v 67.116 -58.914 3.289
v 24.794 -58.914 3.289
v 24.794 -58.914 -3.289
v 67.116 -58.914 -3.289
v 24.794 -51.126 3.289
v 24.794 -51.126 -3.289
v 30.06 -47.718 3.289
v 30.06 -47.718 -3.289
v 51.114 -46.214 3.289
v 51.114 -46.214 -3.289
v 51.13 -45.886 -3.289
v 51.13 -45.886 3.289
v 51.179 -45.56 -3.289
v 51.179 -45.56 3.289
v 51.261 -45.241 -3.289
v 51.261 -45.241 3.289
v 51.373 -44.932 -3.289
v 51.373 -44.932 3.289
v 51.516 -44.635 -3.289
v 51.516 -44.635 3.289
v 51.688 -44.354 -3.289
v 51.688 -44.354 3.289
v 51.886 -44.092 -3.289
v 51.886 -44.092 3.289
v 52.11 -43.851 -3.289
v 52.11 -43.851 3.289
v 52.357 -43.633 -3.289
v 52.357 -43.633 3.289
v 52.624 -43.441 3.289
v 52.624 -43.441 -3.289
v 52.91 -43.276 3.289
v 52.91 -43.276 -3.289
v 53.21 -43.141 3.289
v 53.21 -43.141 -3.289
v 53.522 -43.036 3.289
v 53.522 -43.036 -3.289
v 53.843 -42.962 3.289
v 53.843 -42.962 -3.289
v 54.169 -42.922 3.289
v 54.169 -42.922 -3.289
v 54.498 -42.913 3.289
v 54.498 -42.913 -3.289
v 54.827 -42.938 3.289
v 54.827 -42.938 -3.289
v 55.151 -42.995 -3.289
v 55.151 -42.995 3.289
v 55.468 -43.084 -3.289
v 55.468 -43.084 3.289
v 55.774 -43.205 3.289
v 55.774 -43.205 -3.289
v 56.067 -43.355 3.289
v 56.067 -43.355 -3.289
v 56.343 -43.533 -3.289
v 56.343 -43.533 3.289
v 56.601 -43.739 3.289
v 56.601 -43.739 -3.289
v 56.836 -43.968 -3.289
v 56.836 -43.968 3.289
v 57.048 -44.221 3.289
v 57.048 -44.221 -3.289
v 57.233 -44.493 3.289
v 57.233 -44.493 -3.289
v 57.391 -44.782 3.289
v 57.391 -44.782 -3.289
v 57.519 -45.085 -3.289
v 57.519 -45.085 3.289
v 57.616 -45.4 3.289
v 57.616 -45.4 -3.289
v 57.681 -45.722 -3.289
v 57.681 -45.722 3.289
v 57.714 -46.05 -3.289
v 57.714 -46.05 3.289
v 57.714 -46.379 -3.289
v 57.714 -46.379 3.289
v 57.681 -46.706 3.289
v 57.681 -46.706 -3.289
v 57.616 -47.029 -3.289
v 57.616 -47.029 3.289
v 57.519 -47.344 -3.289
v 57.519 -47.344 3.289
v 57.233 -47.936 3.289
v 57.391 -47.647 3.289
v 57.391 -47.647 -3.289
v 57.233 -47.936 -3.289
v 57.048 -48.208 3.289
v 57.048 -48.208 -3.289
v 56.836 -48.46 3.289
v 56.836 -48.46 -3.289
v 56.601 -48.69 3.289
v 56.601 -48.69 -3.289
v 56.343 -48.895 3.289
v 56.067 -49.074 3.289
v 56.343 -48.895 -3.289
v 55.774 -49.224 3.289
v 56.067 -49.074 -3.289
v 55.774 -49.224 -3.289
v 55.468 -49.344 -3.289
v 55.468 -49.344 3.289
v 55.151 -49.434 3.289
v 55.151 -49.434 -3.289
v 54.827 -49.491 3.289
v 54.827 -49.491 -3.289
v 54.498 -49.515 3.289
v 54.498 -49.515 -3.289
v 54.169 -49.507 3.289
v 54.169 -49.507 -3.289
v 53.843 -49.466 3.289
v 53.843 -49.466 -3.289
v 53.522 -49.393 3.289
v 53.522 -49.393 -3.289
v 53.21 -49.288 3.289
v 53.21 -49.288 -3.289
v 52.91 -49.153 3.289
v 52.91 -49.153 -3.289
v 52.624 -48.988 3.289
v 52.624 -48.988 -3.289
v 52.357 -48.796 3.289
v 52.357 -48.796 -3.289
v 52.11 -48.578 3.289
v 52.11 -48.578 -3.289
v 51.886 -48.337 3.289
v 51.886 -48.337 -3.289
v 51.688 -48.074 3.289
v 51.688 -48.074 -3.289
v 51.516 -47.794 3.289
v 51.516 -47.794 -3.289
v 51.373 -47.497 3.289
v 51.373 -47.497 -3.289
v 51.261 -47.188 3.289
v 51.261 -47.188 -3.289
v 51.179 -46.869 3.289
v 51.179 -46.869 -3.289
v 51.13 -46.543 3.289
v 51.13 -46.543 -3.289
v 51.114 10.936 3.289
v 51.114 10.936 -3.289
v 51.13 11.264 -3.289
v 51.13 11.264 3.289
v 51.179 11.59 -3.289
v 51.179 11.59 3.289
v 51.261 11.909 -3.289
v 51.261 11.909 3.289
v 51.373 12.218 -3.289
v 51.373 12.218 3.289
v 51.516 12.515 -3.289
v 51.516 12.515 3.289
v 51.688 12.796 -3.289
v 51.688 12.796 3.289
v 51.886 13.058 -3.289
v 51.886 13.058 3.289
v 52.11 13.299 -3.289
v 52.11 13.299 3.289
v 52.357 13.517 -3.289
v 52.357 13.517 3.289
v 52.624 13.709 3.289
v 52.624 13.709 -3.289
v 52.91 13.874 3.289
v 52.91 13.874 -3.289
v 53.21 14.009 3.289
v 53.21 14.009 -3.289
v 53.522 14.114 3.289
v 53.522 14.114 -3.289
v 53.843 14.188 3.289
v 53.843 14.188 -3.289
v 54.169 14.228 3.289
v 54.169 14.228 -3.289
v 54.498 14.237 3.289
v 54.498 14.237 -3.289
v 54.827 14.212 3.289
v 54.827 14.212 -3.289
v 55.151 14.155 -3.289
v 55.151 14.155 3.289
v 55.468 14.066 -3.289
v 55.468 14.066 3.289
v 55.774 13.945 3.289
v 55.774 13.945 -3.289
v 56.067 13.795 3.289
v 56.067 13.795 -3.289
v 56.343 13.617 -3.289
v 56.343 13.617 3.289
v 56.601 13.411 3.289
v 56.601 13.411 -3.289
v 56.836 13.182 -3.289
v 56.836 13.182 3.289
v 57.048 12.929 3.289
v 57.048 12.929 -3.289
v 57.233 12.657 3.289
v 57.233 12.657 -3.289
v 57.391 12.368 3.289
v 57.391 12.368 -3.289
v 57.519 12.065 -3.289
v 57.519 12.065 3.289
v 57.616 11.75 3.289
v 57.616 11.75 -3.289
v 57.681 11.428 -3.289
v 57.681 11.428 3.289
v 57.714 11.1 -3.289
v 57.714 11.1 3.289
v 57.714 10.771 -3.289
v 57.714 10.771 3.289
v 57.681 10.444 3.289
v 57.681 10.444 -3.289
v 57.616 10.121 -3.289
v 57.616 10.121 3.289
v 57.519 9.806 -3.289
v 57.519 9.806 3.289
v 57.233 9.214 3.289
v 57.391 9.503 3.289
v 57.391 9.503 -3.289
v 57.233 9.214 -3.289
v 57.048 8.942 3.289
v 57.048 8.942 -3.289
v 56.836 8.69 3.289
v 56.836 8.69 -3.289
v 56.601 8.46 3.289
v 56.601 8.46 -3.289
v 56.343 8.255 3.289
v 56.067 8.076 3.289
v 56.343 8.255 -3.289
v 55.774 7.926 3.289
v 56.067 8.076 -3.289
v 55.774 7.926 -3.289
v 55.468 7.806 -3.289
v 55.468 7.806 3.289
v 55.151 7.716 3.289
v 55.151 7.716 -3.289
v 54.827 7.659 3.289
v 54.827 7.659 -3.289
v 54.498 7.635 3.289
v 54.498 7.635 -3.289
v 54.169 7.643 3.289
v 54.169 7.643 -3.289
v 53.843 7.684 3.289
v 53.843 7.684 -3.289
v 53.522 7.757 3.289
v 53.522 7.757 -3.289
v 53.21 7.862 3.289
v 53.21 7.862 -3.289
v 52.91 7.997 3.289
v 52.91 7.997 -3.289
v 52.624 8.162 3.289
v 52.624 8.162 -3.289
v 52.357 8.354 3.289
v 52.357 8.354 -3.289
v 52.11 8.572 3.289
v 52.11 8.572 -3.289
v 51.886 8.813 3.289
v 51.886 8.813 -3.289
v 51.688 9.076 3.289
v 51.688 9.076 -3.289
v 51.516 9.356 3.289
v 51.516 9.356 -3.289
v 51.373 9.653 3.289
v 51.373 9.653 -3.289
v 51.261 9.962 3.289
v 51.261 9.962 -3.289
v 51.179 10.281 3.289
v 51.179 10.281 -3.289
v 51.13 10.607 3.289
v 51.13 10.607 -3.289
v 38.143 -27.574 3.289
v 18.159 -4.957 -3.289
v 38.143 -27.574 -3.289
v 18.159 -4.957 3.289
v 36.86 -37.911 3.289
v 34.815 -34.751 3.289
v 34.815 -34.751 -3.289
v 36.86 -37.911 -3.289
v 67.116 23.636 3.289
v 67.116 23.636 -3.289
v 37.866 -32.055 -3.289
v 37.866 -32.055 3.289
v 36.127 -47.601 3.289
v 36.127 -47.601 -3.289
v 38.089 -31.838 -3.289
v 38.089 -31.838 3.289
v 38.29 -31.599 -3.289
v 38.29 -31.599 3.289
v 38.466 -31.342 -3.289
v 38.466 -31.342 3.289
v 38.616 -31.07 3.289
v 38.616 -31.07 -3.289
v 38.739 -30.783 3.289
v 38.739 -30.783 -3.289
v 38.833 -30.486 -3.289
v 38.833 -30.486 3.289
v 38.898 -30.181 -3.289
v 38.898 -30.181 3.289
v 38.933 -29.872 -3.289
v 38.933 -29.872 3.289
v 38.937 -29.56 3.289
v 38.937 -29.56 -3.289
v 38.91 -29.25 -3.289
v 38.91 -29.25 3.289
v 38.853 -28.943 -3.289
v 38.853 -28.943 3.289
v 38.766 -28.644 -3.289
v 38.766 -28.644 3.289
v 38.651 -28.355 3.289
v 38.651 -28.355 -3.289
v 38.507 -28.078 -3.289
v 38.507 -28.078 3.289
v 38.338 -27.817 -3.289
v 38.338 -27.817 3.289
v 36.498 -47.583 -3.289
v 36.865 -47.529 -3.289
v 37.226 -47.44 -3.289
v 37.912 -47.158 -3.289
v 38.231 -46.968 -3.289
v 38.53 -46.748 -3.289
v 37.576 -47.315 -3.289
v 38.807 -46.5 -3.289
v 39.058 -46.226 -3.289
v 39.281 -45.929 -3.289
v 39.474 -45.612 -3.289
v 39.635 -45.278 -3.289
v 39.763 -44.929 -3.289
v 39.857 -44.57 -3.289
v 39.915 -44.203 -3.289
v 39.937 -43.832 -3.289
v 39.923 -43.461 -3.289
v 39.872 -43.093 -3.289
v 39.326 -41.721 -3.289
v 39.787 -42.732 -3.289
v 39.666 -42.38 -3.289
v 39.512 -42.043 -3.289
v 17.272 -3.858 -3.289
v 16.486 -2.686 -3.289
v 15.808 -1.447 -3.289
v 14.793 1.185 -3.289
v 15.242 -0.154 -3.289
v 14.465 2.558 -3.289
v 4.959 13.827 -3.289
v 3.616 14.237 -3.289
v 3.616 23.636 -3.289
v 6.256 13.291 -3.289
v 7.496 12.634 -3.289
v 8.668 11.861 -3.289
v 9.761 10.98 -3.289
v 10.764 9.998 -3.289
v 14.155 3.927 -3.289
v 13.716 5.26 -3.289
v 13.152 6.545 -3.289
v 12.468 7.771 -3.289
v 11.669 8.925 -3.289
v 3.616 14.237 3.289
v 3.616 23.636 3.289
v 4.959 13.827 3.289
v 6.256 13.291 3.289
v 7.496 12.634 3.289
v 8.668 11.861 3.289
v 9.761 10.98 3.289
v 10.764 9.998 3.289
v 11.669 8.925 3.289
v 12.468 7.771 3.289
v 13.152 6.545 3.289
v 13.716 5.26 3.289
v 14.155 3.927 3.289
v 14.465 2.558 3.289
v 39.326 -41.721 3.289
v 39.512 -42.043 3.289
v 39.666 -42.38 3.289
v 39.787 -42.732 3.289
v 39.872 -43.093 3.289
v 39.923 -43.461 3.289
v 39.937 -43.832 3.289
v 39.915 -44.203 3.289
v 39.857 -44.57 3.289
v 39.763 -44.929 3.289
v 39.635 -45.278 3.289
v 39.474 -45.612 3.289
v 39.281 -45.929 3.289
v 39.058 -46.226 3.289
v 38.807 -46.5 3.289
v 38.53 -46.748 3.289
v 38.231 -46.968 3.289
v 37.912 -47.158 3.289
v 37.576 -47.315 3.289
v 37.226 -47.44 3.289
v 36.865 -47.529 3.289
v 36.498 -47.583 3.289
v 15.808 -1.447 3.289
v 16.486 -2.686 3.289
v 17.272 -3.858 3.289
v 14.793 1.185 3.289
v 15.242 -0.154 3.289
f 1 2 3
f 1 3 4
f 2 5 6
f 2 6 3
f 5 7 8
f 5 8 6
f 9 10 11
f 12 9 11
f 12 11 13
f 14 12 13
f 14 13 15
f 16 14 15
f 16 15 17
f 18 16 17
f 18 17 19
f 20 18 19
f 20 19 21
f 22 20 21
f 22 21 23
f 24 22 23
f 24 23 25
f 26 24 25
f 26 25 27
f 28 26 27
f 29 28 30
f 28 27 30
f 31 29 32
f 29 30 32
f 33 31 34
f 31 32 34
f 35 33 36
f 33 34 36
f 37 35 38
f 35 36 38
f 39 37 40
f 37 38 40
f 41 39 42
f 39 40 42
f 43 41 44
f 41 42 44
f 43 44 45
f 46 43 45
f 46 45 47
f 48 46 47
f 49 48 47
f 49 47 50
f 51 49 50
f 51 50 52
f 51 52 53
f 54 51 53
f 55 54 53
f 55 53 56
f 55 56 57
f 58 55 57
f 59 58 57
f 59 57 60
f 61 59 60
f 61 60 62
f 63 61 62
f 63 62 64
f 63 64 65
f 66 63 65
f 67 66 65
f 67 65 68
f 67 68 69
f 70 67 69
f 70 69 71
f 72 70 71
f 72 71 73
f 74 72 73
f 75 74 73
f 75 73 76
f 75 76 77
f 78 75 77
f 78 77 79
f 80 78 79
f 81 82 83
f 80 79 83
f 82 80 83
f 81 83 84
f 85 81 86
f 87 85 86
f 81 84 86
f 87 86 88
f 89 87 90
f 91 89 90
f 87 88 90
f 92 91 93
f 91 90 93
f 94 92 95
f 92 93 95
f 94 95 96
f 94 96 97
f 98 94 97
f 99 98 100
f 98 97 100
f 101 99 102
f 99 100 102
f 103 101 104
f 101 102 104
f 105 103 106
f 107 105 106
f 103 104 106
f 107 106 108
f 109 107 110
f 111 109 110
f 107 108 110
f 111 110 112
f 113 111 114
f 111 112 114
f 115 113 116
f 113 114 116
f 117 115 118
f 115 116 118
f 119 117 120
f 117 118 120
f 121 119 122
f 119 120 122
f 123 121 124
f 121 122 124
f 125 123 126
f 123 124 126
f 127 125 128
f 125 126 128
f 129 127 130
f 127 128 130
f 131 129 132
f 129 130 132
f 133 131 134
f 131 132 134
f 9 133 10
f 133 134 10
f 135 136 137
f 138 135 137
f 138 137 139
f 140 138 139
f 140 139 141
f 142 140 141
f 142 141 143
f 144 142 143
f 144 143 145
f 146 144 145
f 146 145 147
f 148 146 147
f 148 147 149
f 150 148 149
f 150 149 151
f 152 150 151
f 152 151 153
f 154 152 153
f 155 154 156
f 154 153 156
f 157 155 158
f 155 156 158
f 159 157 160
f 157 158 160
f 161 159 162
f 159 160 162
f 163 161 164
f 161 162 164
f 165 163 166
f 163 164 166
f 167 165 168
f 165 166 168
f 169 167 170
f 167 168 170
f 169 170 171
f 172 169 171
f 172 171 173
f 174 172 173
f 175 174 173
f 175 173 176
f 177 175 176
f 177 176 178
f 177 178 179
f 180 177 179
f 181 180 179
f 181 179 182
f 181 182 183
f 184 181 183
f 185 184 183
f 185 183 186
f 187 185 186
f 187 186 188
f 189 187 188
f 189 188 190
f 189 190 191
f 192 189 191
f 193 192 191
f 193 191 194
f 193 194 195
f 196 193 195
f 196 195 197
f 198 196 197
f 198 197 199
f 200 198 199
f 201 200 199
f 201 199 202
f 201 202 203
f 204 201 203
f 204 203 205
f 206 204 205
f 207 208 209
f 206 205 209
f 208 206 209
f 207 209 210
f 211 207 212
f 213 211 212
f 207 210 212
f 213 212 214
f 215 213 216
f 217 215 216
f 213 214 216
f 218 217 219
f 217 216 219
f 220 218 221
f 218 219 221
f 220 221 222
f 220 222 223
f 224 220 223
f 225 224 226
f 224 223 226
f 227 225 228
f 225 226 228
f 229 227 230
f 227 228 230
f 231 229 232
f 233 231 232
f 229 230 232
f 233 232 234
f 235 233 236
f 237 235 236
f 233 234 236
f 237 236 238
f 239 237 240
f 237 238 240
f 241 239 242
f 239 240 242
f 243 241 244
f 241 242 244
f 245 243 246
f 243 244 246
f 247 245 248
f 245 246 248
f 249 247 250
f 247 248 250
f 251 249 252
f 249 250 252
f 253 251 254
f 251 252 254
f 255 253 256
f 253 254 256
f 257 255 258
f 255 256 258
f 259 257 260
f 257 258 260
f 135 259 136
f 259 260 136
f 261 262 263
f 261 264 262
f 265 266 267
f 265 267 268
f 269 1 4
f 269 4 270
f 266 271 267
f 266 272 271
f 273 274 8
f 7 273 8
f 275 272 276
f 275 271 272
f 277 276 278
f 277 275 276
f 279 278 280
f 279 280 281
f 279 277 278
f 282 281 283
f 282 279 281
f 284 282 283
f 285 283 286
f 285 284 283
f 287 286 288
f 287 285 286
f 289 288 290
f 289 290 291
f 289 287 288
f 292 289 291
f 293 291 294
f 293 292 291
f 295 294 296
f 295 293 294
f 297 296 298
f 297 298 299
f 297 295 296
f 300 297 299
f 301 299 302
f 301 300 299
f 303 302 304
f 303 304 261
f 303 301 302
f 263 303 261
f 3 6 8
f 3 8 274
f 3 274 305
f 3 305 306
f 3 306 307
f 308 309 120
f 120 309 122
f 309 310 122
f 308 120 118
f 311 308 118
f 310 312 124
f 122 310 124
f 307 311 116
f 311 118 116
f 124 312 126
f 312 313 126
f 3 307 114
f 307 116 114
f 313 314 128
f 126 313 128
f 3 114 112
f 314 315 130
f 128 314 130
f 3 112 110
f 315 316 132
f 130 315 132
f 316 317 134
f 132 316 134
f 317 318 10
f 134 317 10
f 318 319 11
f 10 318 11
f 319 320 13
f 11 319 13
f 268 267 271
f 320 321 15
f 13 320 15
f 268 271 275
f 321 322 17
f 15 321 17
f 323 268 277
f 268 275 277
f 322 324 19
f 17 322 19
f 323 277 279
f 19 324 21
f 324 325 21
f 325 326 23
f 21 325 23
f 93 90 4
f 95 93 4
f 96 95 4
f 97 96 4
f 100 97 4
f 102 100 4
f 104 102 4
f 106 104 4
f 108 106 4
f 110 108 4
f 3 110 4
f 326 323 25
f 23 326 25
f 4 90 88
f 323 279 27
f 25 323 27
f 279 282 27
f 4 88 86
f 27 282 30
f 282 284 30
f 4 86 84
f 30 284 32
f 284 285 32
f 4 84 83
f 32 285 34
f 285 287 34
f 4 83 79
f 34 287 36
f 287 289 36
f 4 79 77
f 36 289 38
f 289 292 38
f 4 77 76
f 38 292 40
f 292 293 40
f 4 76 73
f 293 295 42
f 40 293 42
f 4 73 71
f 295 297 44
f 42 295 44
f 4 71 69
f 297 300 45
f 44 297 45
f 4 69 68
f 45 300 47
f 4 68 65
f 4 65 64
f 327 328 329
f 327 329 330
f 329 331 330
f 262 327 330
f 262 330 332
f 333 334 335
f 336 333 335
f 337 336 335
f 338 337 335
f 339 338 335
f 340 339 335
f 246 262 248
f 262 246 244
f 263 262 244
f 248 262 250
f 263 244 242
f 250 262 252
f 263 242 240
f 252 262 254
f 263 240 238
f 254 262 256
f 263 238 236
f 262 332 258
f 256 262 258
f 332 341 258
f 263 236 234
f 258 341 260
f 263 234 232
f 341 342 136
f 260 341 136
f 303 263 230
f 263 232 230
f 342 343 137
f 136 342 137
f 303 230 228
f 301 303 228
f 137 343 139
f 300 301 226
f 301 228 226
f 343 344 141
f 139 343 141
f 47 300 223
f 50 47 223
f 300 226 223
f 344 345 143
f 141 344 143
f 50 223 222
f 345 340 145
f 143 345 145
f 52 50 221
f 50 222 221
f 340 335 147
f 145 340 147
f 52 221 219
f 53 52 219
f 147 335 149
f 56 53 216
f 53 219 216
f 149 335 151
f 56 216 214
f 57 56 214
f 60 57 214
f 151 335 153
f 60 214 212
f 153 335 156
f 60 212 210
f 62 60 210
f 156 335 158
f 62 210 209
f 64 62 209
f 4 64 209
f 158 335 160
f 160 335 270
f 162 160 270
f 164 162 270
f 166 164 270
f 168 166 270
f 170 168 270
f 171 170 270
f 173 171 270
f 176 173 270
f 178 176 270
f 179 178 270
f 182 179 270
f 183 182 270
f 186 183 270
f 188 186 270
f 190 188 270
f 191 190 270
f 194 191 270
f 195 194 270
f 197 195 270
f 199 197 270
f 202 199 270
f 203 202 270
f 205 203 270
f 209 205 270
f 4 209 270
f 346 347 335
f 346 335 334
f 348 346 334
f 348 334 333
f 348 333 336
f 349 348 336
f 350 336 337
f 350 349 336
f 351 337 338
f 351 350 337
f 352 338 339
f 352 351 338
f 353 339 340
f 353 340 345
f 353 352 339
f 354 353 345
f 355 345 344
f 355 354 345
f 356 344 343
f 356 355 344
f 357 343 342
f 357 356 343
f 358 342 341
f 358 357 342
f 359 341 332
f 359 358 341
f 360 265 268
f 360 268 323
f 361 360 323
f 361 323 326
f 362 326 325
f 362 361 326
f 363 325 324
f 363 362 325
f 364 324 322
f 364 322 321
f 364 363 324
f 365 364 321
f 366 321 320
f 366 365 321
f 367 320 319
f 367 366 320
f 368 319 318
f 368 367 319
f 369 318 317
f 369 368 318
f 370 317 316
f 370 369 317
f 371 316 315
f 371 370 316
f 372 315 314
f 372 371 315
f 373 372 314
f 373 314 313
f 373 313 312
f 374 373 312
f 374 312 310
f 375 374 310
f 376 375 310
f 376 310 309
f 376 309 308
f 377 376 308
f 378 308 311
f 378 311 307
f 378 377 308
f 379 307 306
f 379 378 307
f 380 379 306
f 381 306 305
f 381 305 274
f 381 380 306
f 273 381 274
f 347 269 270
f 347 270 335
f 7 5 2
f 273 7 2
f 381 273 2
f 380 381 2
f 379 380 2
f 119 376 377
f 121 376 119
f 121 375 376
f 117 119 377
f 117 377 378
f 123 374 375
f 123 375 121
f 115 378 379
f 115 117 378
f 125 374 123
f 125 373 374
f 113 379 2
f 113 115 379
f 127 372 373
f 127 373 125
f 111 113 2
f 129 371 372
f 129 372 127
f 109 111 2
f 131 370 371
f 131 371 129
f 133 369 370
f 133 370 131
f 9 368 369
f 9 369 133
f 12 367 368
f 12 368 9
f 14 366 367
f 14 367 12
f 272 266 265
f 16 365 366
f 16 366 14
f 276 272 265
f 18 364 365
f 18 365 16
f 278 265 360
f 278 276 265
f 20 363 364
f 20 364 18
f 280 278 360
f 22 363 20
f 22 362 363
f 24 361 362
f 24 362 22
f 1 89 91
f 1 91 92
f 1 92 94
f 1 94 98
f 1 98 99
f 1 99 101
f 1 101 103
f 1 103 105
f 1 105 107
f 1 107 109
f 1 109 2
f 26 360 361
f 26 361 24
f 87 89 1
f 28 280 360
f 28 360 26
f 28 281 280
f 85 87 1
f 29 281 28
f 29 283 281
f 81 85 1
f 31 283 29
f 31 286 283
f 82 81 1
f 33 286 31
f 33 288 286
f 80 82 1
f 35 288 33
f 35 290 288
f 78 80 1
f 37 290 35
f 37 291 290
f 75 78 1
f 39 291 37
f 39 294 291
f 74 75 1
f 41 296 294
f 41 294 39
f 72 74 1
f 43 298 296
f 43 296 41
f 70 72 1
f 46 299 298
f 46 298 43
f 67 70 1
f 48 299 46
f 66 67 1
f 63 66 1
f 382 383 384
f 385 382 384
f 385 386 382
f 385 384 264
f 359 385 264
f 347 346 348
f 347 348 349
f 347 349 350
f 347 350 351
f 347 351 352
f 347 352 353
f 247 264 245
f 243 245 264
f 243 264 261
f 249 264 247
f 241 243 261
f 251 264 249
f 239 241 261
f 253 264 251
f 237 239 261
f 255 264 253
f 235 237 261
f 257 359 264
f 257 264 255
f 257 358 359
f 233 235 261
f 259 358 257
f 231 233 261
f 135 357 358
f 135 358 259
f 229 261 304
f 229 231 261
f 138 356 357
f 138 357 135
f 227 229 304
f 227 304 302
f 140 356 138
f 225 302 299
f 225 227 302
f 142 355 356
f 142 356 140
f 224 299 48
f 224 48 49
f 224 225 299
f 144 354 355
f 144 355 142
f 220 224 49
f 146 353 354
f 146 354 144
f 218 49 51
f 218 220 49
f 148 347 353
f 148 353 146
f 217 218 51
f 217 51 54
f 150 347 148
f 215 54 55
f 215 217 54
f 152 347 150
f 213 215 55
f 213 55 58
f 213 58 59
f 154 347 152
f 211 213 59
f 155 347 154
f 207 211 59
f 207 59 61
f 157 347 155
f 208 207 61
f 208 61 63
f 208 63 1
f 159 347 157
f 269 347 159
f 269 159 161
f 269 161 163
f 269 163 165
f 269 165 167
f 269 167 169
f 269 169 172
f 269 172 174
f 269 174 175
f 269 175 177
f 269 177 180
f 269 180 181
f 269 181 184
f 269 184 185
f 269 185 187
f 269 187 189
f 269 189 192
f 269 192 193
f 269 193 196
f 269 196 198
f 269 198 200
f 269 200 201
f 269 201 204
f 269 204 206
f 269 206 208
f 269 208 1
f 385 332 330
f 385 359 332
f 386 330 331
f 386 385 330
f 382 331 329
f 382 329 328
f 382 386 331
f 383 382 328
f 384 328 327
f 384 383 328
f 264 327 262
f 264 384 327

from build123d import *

# Parameters (mm, degrees)
BOSS_EXTRUDE2_DEPTH        = 3.2893
FILLET4_R                  = 3.175
F_97_0_26_DIAMETER_HOLE1_D = 6.604


with BuildPart() as part:
    # Sketch1 → Boss-Extrude2 (new, symmetric)
    with BuildSketch(Plane.XY):
        with BuildLine():
            Line((40.245218881, -29.952840417), (34.814702315, -34.75119179))
            Line((34.814702315, -34.75119179), (36.859912069, -37.911424085))
            Line((36.859912069, -37.911424085), (39.325632445, -41.721424085))
            ThreePointArc((39.325632445, -41.721424085), (39.47389391, -45.61207473), (36.127033373, -47.601463693))
            Line((36.127033373, -47.601463693), (30.06004247, -47.717842457))
            Line((30.06004247, -47.717842457), (24.793517597, -51.126183057))
            Line((24.793517597, -51.126183057), (24.793517597, -58.914319794))
            Line((24.793517597, -58.914319794), (50.193517597, -58.914319794))
            Line((50.193517597, -58.914319794), (67.115922286, -58.914319794))
            Line((67.115922286, -58.914319794), (67.115922286, 23.635680206))
            Line((67.115922286, 23.635680206), (3.615922286, 23.635680206))
            Line((3.615922286, 23.635680206), (3.615922286, 14.236541628))
            ThreePointArc((3.615922286, 14.236541628), (10.763958516, 9.998143491), (14.46505327, 2.557690661))
            ThreePointArc((14.46505327, 2.557690661), (15.807885527, -1.447488843), (18.159107069, -4.956964385))
            Line((18.159107069, -4.956964385), (40.245218881, -29.952840417))
        make_face()
    extrude(amount=BOSS_EXTRUDE2_DEPTH, both=True)

    # Fillet4
    fillet4_edges = [part.edges().sort_by_distance(p)[0] for p in [
        (40.245218881, -29.952840417, 0),
    ]]
    fillet(fillet4_edges, radius=FILLET4_R)

    # #97 (0.26) Diameter Hole1 (through all)
    with Locations(Plane(origin=(54.415922286, 10.935680206, 3.2893), x_dir=(1, 0, 0), z_dir=(0, 0, 1))):
        with Locations((0, 0), (0, -57.15)):
            Hole(F_97_0_26_DIAMETER_HOLE1_D / 2)


solid = part.part
